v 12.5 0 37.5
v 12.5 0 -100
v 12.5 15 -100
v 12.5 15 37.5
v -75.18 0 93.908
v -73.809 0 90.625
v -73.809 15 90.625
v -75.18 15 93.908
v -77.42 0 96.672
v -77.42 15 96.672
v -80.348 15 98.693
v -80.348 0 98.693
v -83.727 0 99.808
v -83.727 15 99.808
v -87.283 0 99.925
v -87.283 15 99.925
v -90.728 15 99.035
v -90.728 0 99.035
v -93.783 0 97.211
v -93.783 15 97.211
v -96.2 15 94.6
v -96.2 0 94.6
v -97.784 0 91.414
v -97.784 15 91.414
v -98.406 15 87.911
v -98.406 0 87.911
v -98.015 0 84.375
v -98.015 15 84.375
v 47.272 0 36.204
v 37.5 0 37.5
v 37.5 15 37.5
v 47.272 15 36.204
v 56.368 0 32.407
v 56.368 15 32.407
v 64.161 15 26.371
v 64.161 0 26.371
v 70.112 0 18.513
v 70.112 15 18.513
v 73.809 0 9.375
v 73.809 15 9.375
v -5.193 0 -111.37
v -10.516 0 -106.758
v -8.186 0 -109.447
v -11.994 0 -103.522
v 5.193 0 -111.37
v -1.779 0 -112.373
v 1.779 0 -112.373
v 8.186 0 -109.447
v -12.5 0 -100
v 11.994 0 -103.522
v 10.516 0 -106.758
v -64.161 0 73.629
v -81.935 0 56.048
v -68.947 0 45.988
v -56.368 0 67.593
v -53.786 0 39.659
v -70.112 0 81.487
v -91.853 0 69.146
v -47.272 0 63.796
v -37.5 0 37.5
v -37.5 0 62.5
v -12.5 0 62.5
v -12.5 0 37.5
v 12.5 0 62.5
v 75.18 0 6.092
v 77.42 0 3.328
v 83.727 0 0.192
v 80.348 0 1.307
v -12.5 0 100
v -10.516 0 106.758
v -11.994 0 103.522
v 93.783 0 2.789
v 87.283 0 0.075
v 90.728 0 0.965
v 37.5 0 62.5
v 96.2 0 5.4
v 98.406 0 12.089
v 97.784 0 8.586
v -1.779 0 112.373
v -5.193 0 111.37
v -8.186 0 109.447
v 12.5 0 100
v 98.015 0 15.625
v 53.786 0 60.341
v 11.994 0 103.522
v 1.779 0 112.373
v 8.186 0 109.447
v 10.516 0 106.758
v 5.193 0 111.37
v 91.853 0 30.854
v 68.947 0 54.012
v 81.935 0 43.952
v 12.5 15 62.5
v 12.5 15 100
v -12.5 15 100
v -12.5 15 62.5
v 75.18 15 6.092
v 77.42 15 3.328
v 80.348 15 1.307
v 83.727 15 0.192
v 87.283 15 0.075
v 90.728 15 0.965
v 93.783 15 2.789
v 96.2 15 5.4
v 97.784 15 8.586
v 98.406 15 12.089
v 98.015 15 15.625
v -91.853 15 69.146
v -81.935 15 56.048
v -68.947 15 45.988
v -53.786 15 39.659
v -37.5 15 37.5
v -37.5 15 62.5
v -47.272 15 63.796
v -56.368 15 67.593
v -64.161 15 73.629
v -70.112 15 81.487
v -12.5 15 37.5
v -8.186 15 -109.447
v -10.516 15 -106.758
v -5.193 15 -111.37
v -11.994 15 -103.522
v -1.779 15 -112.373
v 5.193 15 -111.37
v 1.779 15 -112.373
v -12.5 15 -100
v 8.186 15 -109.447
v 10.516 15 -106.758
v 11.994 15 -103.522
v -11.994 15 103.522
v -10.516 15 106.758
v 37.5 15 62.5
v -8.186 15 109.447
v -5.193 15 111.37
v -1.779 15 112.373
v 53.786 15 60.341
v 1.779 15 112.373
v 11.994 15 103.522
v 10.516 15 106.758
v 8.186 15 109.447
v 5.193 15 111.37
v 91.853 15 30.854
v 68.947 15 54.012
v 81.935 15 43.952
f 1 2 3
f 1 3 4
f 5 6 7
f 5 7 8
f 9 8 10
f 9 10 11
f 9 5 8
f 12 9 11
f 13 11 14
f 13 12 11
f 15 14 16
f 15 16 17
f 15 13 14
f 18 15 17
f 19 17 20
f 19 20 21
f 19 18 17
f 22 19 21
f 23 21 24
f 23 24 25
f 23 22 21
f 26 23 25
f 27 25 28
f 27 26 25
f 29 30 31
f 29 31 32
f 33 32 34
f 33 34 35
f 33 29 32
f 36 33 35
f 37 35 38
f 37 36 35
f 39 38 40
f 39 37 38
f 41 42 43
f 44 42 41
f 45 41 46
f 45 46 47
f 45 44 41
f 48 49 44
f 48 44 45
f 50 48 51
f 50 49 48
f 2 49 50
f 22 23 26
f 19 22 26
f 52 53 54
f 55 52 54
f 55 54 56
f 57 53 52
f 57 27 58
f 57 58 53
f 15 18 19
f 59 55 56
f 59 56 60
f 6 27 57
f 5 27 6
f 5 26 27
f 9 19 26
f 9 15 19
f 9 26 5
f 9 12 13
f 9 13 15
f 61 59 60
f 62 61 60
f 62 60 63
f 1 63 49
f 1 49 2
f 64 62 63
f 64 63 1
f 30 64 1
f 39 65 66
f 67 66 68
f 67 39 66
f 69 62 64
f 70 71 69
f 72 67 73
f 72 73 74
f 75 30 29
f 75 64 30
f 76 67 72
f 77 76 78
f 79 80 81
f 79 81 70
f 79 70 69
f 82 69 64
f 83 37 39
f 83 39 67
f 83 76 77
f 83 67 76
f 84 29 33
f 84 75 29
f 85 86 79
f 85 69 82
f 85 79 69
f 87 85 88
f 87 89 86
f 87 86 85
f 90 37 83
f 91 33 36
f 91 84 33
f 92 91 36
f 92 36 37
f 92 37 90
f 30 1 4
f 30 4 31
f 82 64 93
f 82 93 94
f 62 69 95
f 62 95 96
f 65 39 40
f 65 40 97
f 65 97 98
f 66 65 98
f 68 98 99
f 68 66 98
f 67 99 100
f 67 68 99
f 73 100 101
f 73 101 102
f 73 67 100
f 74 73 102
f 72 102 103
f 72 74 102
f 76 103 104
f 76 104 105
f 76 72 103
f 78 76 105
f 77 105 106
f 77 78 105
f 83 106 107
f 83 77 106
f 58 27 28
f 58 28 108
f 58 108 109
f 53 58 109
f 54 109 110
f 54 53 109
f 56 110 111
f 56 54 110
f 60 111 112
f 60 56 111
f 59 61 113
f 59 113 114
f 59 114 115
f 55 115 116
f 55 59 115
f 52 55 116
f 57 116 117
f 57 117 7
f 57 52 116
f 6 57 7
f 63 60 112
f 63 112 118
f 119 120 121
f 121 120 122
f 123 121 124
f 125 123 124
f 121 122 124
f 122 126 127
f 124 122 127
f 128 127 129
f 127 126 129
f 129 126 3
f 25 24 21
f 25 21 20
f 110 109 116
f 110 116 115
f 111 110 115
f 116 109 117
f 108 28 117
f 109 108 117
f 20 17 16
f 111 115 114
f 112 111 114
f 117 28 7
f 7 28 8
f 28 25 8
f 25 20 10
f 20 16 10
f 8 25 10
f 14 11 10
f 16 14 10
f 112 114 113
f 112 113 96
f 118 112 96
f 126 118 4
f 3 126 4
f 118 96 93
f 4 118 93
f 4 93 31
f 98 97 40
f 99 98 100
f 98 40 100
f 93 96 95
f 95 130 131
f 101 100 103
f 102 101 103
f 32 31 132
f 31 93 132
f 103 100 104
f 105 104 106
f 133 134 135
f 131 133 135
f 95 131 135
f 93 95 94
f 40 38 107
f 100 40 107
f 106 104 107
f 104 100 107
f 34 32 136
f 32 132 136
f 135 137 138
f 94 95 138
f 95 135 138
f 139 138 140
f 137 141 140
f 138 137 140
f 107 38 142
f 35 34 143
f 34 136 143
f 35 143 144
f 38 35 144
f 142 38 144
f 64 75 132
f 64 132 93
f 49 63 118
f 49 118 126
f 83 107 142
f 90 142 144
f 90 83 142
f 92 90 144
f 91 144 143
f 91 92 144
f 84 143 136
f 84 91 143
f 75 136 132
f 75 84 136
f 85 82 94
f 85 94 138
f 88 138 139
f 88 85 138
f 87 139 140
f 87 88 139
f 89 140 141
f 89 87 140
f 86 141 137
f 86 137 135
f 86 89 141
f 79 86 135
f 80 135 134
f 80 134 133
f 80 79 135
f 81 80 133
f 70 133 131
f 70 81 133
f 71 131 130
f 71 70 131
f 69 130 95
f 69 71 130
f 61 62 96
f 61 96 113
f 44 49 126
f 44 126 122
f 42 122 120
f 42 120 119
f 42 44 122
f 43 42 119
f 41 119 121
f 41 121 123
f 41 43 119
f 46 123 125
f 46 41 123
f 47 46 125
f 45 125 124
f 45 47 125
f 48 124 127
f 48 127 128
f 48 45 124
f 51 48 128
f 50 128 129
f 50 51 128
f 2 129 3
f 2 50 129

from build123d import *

# Parameters (mm, degrees)
F0_W     = 25
F0_H     = 12.5
F1_DEPTH = 15


with BuildPart() as f1:
    # F0 (on Front) → F1 (new body)
    with BuildSketch(Plane.XZ):
        with BuildLine():
            Line((12.5, -100), (-12.5, -100))
            ThreePointArc((-12.5, -100), (0, -112.5), (12.5, -100))
        make_face()
        with BuildLine():
            ThreePointArc((12.5, -100), (0, -87.5), (-12.5, -100))
            Line((-12.5, -100), (12.5, -100))
        make_face()
        with BuildLine():
            Line((12.5, 37.5), (-12.5, 37.5))
            Line((-12.5, 37.5), (-12.5, -100))
            ThreePointArc((-12.5, -100), (0, -87.5), (12.5, -100))
            Line((12.5, -100), (12.5, 37.5))
        make_face()
        with Locations((0, 56.25)):
            Rectangle(F0_W, F0_H)
        with Locations((0, 43.75)):
            Rectangle(F0_W, F0_H)
        with BuildLine():
            Line((-12.5, 50), (-12.5, 62.5))
            Line((-12.5, 62.5), (-37.5, 62.5))
            ThreePointArc((-37.5, 62.5), (-60.4639663386, 70.3536469359), (-73.8092188707, 90.625))
            ThreePointArc((-73.8092188707, 90.625), (-89.0372918276, 99.6030729569), (-98.0153647845, 84.375))
            ThreePointArc((-98.0153647845, 84.375), (-75.773277231, 50.5894115599), (-37.5, 37.5))
            Line((-37.5, 37.5), (-12.5, 37.5))
            Line((-12.5, 37.5), (-12.5, 50))
        make_face()
        with BuildLine():
            Line((37.5, 50), (12.5, 50))
            Line((12.5, 50), (12.5, 37.5))
            Line((12.5, 37.5), (37.5, 37.5))
            ThreePointArc((37.5, 37.5), (60.4639663386, 29.6463530641), (73.8092188707, 9.375))
            ThreePointArc((73.8092188707, 9.375), (89.0372918276, 0.3969270431), (98.0153647845, 15.625))
            ThreePointArc((98.0153647845, 15.625), (75.773277231, 49.4105884401), (37.5, 62.5))
            ThreePointArc((37.5, 62.5), (46.875, 58.2679728471), (49.9019592706, 48.4375))
            ThreePointArc((49.9019592706, 48.4375), (43.75, 49.6078370825), (37.5, 50))
        make_face()
        with BuildLine():
            Line((37.5, 62.5), (12.5, 62.5))
            Line((12.5, 62.5), (12.5, 50))
            Line((12.5, 50), (37.5, 50))
            ThreePointArc((37.5, 50), (43.75, 49.6078370825), (49.9019592706, 48.4375))
            ThreePointArc((49.9019592706, 48.4375), (46.875, 58.2679728471), (37.5, 62.5))
        make_face()
        with BuildLine():
            ThreePointArc((12.5, 100), (0, 87.5), (-12.5, 100))
            Line((-12.5, 100), (-12.5, 62.5))
            Line((-12.5, 62.5), (12.5, 62.5))
            Line((12.5, 62.5), (12.5, 100))
        make_face()
        with BuildLine():
            Line((12.5, 100), (-12.5, 100))
            ThreePointArc((-12.5, 100), (0, 87.5), (12.5, 100))
        make_face()
        with BuildLine():
            ThreePointArc((12.5, 100), (0, 112.5), (-12.5, 100))
            Line((-12.5, 100), (12.5, 100))
        make_face()
    extrude(amount=-F1_DEPTH)


solid = f1.part
